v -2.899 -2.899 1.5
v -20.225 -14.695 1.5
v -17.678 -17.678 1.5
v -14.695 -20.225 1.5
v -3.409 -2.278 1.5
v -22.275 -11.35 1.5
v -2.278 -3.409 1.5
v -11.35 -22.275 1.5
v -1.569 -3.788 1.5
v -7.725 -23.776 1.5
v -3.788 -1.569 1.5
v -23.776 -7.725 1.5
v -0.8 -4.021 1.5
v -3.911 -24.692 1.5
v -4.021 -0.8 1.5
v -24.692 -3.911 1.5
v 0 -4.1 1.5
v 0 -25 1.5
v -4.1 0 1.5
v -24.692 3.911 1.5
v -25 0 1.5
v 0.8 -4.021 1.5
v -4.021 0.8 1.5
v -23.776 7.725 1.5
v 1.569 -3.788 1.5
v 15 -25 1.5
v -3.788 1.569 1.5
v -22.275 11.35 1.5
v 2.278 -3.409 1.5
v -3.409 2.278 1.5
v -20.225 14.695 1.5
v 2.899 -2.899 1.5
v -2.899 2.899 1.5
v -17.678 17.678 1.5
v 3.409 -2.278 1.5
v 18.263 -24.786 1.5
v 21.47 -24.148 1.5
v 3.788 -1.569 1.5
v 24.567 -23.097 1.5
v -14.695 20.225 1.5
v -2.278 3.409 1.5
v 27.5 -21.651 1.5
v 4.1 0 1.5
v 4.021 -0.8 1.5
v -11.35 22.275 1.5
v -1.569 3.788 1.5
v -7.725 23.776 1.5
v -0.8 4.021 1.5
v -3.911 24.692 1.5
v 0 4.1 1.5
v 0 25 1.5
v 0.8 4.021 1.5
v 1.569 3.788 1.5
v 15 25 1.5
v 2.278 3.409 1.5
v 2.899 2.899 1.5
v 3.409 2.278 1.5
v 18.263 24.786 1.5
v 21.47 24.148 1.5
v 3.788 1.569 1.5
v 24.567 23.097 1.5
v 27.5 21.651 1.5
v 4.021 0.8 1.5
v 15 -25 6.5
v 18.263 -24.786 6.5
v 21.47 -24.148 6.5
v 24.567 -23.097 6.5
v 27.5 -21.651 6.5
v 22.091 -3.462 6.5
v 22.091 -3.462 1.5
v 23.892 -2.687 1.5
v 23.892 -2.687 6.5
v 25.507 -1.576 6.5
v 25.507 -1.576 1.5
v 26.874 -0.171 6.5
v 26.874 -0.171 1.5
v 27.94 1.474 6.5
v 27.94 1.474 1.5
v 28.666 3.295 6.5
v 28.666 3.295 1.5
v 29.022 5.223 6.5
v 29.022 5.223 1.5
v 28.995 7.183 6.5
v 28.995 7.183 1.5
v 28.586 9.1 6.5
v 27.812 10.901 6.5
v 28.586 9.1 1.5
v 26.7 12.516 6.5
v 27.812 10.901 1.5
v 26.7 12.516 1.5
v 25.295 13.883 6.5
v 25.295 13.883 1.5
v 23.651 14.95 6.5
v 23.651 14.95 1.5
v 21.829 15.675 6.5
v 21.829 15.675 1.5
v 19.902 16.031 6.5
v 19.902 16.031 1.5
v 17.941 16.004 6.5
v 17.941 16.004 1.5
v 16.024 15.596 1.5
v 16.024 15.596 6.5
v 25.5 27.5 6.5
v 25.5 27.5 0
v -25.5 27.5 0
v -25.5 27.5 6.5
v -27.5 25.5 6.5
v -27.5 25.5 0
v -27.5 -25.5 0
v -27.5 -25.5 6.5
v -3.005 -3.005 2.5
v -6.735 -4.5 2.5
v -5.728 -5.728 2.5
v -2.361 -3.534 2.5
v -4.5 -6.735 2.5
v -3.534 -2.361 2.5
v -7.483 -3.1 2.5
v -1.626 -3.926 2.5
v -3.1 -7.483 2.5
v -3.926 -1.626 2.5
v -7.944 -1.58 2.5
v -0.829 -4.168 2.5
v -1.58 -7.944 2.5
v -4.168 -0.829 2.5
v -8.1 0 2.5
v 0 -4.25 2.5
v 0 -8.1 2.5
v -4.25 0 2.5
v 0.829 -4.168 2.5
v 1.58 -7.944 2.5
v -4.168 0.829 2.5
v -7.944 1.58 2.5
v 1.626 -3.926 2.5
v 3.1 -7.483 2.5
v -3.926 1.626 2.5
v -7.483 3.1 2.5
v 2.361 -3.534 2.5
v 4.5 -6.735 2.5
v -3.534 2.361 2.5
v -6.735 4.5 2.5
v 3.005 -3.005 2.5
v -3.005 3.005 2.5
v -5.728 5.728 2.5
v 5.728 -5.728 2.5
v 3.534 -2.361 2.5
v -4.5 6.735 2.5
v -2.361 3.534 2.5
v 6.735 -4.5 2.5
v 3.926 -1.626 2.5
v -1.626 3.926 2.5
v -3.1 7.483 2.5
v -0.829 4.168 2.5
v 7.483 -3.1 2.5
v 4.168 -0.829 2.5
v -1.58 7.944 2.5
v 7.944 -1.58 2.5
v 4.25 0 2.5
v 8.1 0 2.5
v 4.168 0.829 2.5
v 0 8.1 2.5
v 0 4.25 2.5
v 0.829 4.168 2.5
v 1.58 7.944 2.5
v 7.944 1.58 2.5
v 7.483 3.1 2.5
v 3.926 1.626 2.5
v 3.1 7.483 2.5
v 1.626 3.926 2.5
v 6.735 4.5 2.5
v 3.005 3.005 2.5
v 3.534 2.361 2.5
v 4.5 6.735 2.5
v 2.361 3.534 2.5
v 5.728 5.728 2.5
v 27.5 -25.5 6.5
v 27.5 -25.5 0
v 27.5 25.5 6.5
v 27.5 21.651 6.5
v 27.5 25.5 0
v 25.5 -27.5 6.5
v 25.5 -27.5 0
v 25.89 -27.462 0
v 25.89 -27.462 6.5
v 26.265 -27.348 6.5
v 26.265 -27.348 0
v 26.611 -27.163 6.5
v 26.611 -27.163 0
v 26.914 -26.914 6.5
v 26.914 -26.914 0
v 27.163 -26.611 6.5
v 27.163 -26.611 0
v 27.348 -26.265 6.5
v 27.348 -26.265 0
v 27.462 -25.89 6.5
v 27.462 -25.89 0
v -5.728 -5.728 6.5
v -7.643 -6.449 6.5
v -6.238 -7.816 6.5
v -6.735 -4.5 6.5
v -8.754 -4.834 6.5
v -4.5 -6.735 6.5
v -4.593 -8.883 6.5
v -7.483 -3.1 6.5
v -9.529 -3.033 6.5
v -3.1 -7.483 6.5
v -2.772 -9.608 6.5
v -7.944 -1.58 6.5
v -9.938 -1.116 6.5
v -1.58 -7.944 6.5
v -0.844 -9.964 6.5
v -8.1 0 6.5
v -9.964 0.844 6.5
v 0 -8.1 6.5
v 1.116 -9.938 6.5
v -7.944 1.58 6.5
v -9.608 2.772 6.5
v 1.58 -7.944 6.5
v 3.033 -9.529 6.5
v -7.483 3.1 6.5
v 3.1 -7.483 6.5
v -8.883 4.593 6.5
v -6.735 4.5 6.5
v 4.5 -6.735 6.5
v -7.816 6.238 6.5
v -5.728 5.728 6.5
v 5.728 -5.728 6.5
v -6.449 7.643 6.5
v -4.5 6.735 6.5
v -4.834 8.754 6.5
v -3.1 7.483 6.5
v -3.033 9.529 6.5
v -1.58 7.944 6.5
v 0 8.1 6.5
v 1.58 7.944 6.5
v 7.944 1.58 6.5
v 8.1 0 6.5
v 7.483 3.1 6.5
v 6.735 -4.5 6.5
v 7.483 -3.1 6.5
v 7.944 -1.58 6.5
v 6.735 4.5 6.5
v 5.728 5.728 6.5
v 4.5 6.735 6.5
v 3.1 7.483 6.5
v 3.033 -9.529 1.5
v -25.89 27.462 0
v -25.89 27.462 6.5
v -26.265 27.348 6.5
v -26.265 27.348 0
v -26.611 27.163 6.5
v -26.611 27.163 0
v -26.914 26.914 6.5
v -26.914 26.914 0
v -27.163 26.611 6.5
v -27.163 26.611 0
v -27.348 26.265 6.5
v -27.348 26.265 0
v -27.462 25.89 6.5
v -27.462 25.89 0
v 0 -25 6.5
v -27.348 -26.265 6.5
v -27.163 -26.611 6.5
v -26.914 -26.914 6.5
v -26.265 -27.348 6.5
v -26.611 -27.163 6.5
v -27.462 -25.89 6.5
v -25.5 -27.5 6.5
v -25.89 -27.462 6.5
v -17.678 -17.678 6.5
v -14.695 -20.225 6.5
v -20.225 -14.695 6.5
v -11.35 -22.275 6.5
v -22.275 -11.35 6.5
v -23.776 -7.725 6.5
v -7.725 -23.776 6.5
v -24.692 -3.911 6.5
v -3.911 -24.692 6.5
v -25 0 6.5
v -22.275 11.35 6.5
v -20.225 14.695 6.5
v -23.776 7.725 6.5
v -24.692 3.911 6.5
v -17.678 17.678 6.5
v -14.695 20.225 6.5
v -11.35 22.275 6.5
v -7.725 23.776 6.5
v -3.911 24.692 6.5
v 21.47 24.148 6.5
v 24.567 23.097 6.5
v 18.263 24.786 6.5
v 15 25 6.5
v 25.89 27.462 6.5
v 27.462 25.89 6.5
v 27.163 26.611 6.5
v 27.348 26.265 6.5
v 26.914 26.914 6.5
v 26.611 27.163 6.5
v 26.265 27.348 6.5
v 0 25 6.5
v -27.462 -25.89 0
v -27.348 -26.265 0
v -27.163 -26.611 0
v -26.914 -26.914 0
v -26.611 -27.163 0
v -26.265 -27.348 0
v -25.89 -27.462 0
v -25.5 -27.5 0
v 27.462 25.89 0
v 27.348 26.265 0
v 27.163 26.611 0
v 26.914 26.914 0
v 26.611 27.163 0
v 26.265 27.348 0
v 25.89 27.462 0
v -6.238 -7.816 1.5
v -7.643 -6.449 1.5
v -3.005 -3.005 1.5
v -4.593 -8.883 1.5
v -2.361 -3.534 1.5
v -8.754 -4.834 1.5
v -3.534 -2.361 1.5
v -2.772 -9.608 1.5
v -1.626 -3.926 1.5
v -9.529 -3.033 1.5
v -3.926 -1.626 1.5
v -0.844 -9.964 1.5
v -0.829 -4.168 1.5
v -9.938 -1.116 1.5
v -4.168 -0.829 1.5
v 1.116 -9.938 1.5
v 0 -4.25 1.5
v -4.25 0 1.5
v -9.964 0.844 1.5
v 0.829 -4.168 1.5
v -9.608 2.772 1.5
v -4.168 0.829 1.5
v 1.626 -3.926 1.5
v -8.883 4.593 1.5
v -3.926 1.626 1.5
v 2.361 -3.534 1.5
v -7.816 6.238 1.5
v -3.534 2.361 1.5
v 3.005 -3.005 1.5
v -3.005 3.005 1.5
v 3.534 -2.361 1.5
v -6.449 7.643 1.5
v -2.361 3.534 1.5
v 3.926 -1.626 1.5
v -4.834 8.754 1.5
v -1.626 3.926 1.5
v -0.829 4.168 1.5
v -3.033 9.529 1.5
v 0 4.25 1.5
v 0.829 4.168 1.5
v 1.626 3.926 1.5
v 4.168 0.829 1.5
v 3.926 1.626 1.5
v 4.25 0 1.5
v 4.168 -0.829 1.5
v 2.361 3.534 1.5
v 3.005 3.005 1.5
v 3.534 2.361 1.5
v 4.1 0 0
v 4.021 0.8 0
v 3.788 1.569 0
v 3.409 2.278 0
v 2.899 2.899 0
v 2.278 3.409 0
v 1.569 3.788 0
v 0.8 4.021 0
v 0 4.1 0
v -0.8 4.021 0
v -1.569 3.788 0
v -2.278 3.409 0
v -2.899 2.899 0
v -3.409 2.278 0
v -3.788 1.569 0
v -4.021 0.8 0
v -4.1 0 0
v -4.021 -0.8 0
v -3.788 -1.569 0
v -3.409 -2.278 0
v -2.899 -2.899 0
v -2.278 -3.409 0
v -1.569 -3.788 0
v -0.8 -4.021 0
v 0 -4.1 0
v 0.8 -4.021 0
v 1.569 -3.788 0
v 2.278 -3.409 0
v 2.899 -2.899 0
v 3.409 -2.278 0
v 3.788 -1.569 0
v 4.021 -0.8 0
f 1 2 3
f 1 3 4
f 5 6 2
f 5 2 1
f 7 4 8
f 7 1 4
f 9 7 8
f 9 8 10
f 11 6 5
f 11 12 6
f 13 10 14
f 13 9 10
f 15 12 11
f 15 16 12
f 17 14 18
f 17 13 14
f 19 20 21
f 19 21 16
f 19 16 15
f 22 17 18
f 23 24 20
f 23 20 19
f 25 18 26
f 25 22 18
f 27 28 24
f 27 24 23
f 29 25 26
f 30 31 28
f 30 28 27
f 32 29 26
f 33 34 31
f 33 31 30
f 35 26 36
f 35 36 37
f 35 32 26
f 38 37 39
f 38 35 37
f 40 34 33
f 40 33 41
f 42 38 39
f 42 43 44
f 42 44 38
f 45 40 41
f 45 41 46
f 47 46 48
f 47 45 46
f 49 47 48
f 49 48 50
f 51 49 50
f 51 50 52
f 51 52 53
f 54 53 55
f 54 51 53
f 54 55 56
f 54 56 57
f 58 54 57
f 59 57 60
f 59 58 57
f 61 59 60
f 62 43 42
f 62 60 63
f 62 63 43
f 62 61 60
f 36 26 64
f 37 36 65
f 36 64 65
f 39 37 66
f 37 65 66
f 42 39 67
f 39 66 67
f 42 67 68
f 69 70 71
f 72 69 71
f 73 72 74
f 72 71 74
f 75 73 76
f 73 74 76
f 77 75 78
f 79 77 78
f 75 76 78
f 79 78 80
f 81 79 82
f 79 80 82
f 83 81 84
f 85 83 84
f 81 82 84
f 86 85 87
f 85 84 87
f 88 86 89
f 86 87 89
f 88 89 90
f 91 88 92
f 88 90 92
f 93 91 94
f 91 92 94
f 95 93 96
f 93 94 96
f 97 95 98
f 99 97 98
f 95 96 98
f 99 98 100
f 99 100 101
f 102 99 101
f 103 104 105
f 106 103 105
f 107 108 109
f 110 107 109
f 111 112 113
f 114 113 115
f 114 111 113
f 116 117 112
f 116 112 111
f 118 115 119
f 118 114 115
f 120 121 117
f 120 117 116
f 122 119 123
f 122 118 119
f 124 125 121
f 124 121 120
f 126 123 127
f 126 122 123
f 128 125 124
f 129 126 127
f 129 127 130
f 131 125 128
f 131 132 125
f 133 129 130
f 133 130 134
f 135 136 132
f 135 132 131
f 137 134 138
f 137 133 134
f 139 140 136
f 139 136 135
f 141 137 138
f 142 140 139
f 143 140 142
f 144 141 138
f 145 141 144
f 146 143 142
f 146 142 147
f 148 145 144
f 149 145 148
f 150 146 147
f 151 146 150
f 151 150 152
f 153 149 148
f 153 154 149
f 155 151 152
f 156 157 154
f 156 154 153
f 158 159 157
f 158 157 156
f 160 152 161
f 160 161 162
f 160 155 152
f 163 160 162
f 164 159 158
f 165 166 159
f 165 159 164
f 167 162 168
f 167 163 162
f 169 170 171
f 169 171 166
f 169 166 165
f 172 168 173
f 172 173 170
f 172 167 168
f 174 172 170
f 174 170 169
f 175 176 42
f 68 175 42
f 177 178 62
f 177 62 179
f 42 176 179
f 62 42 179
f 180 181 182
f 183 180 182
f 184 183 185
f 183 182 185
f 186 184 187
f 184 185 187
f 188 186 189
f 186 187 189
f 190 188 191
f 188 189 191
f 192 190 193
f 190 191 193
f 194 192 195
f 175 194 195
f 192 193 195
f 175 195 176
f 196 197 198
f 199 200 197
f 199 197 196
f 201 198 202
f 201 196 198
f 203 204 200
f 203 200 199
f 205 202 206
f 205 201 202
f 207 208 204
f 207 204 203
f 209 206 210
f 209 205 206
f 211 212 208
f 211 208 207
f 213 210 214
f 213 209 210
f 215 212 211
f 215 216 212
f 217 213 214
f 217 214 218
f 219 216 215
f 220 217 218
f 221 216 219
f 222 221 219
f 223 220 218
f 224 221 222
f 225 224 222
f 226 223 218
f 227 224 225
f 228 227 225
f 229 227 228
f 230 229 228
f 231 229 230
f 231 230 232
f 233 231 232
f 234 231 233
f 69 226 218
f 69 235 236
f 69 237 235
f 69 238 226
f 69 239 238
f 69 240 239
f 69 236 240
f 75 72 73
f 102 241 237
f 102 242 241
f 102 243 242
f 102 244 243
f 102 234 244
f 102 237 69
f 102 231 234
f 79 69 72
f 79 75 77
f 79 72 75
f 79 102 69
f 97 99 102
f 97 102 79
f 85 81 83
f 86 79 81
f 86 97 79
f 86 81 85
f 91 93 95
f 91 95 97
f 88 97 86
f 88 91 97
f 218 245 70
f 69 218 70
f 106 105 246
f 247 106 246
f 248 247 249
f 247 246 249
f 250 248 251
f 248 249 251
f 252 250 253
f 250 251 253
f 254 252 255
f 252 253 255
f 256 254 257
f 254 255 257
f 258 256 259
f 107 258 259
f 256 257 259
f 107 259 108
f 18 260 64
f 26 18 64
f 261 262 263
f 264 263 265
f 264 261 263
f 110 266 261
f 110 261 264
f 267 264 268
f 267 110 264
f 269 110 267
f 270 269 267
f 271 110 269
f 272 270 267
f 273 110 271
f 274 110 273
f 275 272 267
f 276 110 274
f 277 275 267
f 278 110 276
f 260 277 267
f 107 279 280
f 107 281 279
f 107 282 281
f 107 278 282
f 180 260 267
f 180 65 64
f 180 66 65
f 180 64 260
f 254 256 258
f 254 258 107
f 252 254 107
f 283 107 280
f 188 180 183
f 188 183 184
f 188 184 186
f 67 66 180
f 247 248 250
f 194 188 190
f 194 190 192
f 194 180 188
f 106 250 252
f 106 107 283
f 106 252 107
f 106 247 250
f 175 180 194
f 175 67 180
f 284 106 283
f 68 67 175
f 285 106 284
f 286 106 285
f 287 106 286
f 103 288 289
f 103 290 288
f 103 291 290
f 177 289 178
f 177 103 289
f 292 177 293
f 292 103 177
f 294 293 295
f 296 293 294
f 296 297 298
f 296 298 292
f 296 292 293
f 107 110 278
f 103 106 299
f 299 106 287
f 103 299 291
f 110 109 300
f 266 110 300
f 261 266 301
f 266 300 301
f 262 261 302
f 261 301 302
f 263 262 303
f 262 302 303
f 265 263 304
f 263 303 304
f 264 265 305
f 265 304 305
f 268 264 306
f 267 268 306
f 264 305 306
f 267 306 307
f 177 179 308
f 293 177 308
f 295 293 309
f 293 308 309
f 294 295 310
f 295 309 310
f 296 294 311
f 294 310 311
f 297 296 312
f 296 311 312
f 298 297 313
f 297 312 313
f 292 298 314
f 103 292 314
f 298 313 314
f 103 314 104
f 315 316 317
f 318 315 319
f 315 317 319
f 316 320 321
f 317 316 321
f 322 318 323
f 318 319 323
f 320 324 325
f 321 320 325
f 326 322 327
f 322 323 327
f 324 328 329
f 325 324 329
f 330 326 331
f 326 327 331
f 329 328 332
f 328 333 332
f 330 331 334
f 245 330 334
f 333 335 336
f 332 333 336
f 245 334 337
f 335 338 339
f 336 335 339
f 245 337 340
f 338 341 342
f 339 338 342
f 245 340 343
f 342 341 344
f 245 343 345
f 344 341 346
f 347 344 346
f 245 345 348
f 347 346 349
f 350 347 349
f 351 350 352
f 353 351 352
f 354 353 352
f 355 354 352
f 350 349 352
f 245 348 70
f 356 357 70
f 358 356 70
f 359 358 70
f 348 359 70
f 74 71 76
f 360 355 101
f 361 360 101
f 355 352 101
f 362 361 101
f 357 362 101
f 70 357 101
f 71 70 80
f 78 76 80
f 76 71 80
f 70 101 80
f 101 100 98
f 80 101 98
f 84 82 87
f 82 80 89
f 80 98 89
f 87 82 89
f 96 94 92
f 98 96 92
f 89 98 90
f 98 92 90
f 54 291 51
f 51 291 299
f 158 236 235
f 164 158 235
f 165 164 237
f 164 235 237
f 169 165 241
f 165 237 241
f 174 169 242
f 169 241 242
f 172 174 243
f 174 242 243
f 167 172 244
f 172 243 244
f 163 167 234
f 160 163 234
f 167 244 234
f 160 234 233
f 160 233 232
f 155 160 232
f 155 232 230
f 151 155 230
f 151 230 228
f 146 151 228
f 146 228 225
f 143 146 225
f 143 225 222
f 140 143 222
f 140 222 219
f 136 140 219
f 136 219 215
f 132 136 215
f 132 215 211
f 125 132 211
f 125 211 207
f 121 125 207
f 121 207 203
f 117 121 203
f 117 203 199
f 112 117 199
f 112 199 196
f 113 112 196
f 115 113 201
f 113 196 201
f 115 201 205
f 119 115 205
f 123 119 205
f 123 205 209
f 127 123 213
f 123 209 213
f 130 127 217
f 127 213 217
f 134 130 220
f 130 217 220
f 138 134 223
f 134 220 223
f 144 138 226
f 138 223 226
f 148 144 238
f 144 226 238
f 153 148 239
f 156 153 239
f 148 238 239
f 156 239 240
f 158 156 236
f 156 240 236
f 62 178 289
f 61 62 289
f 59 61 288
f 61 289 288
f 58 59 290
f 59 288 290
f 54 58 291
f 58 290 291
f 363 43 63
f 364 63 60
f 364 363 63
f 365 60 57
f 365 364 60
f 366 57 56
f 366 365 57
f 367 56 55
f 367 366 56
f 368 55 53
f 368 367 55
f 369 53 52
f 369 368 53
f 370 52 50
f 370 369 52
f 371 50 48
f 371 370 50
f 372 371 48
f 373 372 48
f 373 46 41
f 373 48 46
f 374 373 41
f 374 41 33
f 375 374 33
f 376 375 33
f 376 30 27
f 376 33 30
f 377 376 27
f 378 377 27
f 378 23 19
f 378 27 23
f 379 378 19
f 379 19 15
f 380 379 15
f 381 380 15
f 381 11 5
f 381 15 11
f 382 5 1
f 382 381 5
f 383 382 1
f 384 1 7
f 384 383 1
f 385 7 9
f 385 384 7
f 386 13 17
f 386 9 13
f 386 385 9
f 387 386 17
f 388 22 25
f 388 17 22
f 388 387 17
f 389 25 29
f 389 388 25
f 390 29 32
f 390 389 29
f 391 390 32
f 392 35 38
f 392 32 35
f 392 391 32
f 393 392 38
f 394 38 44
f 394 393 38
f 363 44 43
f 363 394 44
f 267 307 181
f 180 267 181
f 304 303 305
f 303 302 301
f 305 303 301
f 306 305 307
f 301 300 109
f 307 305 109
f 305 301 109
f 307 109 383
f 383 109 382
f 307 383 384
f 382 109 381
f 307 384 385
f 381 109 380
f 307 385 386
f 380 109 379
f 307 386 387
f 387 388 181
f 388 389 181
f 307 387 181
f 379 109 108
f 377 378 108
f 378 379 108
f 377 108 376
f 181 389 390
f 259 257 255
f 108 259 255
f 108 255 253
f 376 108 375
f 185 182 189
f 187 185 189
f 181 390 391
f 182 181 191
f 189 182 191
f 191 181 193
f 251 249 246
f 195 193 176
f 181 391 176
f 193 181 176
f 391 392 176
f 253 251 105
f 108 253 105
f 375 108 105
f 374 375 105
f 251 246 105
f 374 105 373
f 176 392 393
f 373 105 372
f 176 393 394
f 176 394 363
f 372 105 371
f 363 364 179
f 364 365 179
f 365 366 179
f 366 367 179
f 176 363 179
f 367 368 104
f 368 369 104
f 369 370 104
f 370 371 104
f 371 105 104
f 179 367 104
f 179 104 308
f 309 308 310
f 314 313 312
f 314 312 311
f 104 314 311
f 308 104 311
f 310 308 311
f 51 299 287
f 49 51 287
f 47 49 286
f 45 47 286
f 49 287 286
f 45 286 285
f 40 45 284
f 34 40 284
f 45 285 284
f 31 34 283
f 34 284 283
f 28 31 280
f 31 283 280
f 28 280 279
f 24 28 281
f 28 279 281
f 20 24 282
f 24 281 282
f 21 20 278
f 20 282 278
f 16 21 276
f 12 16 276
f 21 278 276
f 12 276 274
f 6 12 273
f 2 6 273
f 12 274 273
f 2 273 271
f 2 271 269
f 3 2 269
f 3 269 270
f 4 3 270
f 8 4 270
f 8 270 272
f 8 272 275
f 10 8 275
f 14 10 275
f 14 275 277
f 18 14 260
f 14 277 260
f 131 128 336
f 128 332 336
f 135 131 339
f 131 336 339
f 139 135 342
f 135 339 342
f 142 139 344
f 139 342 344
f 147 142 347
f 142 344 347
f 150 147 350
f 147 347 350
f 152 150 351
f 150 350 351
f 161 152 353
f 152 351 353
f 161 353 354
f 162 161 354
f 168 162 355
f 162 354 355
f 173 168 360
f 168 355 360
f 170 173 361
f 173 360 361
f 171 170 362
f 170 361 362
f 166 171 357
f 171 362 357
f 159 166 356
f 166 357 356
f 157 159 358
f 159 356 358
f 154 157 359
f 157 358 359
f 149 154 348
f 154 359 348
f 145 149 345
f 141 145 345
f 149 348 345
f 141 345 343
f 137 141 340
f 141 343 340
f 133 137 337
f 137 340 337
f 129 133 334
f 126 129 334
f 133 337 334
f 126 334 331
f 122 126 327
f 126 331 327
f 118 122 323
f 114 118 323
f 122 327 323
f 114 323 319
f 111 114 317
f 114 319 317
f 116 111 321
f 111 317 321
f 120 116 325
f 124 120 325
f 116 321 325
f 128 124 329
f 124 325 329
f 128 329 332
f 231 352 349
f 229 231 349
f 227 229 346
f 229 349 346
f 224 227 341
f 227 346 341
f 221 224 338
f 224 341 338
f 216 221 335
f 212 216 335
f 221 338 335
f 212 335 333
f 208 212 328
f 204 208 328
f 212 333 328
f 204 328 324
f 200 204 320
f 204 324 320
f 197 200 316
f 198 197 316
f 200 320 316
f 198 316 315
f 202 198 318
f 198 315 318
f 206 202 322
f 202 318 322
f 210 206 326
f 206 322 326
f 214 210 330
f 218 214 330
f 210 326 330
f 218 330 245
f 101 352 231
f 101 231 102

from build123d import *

# Parameters (mm, degrees)
PAD_DEPTH        = 5
HOLE_D           = 8.5
HOLE_CBORE_D     = 16.2
HOLE_CBORE_DEPTH = 4
PAD001_DEPTH     = 6.5
POCKET_DEPTH     = 5
SKETCH005_R      = 4.1
POCKET001_DEPTH  = 6.501


with BuildPart() as body:
    # Sketch001 → Pad (new body)
    with BuildSketch(Plane.XY):
        with BuildLine():
            ThreePointArc((-3.033463, 9.528804), (-9.528804, -3.033463), (3.033463, -9.528804))
            Line((3.033463, -9.528804), (22.091071, -3.461878))
            ThreePointArc((22.091071, -3.461878), (28.586412, 9.100389), (16.024145, 15.59573))
            Line((-3.033463, 9.528804), (16.024145, 15.59573))
        make_face()
    extrude(amount=PAD_DEPTH)

    # Hole (through all)
    with Locations(Plane.XY.offset(5)):
        with Locations((0, 0)):
            CounterBoreHole(HOLE_D / 2, HOLE_CBORE_D / 2, HOLE_CBORE_DEPTH)


with BuildPart() as body_1:
    # Body placement: moved
    add(body.part.moved(Location((0, 0, 1.5))))


with BuildPart() as corpo:
    # Sketch003 → Pad001 (new body)
    with BuildSketch(Plane.XY):
        with BuildLine():
            Line((-27.5, 25.5), (-27.5, -25.5))
            ThreePointArc((-27.5, -25.5), (-26.914214, -26.914214), (-25.5, -27.5))
            Line((-25.5, -27.5), (25.5, -27.5))
            ThreePointArc((25.5, -27.5), (26.914214, -26.914214), (27.5, -25.5))
            Line((27.5, -25.5), (27.5, 25.5))
            ThreePointArc((27.5, 25.5), (26.914214, 26.914214), (25.5, 27.5))
            Line((25.5, 27.5), (-25.5, 27.5))
            ThreePointArc((-25.5, 27.5), (-26.914214, 26.914214), (-27.5, 25.5))
        make_face()
    extrude(amount=PAD001_DEPTH)

    # Sketch004 → Pocket (cut)
    with BuildSketch(Plane.XY.offset(6.5)):
        with BuildLine():
            ThreePointArc((0, 25), (-25, 0), (0, -25))
            Line((0, -25), (15, -25))
            ThreePointArc((15, -25), (40, 2.9e-05), (14.999942, 25))
            Line((14.999942, 25), (0, 25))
        make_face()
    extrude(amount=-POCKET_DEPTH, mode=Mode.SUBTRACT)

    # Sketch005 → Pocket001 (cut, through all)
    with BuildSketch(Plane.XY):
        Circle(SKETCH005_R)
    extrude(amount=POCKET001_DEPTH, mode=Mode.SUBTRACT)


solid = Compound([body_1.part, corpo.part])
